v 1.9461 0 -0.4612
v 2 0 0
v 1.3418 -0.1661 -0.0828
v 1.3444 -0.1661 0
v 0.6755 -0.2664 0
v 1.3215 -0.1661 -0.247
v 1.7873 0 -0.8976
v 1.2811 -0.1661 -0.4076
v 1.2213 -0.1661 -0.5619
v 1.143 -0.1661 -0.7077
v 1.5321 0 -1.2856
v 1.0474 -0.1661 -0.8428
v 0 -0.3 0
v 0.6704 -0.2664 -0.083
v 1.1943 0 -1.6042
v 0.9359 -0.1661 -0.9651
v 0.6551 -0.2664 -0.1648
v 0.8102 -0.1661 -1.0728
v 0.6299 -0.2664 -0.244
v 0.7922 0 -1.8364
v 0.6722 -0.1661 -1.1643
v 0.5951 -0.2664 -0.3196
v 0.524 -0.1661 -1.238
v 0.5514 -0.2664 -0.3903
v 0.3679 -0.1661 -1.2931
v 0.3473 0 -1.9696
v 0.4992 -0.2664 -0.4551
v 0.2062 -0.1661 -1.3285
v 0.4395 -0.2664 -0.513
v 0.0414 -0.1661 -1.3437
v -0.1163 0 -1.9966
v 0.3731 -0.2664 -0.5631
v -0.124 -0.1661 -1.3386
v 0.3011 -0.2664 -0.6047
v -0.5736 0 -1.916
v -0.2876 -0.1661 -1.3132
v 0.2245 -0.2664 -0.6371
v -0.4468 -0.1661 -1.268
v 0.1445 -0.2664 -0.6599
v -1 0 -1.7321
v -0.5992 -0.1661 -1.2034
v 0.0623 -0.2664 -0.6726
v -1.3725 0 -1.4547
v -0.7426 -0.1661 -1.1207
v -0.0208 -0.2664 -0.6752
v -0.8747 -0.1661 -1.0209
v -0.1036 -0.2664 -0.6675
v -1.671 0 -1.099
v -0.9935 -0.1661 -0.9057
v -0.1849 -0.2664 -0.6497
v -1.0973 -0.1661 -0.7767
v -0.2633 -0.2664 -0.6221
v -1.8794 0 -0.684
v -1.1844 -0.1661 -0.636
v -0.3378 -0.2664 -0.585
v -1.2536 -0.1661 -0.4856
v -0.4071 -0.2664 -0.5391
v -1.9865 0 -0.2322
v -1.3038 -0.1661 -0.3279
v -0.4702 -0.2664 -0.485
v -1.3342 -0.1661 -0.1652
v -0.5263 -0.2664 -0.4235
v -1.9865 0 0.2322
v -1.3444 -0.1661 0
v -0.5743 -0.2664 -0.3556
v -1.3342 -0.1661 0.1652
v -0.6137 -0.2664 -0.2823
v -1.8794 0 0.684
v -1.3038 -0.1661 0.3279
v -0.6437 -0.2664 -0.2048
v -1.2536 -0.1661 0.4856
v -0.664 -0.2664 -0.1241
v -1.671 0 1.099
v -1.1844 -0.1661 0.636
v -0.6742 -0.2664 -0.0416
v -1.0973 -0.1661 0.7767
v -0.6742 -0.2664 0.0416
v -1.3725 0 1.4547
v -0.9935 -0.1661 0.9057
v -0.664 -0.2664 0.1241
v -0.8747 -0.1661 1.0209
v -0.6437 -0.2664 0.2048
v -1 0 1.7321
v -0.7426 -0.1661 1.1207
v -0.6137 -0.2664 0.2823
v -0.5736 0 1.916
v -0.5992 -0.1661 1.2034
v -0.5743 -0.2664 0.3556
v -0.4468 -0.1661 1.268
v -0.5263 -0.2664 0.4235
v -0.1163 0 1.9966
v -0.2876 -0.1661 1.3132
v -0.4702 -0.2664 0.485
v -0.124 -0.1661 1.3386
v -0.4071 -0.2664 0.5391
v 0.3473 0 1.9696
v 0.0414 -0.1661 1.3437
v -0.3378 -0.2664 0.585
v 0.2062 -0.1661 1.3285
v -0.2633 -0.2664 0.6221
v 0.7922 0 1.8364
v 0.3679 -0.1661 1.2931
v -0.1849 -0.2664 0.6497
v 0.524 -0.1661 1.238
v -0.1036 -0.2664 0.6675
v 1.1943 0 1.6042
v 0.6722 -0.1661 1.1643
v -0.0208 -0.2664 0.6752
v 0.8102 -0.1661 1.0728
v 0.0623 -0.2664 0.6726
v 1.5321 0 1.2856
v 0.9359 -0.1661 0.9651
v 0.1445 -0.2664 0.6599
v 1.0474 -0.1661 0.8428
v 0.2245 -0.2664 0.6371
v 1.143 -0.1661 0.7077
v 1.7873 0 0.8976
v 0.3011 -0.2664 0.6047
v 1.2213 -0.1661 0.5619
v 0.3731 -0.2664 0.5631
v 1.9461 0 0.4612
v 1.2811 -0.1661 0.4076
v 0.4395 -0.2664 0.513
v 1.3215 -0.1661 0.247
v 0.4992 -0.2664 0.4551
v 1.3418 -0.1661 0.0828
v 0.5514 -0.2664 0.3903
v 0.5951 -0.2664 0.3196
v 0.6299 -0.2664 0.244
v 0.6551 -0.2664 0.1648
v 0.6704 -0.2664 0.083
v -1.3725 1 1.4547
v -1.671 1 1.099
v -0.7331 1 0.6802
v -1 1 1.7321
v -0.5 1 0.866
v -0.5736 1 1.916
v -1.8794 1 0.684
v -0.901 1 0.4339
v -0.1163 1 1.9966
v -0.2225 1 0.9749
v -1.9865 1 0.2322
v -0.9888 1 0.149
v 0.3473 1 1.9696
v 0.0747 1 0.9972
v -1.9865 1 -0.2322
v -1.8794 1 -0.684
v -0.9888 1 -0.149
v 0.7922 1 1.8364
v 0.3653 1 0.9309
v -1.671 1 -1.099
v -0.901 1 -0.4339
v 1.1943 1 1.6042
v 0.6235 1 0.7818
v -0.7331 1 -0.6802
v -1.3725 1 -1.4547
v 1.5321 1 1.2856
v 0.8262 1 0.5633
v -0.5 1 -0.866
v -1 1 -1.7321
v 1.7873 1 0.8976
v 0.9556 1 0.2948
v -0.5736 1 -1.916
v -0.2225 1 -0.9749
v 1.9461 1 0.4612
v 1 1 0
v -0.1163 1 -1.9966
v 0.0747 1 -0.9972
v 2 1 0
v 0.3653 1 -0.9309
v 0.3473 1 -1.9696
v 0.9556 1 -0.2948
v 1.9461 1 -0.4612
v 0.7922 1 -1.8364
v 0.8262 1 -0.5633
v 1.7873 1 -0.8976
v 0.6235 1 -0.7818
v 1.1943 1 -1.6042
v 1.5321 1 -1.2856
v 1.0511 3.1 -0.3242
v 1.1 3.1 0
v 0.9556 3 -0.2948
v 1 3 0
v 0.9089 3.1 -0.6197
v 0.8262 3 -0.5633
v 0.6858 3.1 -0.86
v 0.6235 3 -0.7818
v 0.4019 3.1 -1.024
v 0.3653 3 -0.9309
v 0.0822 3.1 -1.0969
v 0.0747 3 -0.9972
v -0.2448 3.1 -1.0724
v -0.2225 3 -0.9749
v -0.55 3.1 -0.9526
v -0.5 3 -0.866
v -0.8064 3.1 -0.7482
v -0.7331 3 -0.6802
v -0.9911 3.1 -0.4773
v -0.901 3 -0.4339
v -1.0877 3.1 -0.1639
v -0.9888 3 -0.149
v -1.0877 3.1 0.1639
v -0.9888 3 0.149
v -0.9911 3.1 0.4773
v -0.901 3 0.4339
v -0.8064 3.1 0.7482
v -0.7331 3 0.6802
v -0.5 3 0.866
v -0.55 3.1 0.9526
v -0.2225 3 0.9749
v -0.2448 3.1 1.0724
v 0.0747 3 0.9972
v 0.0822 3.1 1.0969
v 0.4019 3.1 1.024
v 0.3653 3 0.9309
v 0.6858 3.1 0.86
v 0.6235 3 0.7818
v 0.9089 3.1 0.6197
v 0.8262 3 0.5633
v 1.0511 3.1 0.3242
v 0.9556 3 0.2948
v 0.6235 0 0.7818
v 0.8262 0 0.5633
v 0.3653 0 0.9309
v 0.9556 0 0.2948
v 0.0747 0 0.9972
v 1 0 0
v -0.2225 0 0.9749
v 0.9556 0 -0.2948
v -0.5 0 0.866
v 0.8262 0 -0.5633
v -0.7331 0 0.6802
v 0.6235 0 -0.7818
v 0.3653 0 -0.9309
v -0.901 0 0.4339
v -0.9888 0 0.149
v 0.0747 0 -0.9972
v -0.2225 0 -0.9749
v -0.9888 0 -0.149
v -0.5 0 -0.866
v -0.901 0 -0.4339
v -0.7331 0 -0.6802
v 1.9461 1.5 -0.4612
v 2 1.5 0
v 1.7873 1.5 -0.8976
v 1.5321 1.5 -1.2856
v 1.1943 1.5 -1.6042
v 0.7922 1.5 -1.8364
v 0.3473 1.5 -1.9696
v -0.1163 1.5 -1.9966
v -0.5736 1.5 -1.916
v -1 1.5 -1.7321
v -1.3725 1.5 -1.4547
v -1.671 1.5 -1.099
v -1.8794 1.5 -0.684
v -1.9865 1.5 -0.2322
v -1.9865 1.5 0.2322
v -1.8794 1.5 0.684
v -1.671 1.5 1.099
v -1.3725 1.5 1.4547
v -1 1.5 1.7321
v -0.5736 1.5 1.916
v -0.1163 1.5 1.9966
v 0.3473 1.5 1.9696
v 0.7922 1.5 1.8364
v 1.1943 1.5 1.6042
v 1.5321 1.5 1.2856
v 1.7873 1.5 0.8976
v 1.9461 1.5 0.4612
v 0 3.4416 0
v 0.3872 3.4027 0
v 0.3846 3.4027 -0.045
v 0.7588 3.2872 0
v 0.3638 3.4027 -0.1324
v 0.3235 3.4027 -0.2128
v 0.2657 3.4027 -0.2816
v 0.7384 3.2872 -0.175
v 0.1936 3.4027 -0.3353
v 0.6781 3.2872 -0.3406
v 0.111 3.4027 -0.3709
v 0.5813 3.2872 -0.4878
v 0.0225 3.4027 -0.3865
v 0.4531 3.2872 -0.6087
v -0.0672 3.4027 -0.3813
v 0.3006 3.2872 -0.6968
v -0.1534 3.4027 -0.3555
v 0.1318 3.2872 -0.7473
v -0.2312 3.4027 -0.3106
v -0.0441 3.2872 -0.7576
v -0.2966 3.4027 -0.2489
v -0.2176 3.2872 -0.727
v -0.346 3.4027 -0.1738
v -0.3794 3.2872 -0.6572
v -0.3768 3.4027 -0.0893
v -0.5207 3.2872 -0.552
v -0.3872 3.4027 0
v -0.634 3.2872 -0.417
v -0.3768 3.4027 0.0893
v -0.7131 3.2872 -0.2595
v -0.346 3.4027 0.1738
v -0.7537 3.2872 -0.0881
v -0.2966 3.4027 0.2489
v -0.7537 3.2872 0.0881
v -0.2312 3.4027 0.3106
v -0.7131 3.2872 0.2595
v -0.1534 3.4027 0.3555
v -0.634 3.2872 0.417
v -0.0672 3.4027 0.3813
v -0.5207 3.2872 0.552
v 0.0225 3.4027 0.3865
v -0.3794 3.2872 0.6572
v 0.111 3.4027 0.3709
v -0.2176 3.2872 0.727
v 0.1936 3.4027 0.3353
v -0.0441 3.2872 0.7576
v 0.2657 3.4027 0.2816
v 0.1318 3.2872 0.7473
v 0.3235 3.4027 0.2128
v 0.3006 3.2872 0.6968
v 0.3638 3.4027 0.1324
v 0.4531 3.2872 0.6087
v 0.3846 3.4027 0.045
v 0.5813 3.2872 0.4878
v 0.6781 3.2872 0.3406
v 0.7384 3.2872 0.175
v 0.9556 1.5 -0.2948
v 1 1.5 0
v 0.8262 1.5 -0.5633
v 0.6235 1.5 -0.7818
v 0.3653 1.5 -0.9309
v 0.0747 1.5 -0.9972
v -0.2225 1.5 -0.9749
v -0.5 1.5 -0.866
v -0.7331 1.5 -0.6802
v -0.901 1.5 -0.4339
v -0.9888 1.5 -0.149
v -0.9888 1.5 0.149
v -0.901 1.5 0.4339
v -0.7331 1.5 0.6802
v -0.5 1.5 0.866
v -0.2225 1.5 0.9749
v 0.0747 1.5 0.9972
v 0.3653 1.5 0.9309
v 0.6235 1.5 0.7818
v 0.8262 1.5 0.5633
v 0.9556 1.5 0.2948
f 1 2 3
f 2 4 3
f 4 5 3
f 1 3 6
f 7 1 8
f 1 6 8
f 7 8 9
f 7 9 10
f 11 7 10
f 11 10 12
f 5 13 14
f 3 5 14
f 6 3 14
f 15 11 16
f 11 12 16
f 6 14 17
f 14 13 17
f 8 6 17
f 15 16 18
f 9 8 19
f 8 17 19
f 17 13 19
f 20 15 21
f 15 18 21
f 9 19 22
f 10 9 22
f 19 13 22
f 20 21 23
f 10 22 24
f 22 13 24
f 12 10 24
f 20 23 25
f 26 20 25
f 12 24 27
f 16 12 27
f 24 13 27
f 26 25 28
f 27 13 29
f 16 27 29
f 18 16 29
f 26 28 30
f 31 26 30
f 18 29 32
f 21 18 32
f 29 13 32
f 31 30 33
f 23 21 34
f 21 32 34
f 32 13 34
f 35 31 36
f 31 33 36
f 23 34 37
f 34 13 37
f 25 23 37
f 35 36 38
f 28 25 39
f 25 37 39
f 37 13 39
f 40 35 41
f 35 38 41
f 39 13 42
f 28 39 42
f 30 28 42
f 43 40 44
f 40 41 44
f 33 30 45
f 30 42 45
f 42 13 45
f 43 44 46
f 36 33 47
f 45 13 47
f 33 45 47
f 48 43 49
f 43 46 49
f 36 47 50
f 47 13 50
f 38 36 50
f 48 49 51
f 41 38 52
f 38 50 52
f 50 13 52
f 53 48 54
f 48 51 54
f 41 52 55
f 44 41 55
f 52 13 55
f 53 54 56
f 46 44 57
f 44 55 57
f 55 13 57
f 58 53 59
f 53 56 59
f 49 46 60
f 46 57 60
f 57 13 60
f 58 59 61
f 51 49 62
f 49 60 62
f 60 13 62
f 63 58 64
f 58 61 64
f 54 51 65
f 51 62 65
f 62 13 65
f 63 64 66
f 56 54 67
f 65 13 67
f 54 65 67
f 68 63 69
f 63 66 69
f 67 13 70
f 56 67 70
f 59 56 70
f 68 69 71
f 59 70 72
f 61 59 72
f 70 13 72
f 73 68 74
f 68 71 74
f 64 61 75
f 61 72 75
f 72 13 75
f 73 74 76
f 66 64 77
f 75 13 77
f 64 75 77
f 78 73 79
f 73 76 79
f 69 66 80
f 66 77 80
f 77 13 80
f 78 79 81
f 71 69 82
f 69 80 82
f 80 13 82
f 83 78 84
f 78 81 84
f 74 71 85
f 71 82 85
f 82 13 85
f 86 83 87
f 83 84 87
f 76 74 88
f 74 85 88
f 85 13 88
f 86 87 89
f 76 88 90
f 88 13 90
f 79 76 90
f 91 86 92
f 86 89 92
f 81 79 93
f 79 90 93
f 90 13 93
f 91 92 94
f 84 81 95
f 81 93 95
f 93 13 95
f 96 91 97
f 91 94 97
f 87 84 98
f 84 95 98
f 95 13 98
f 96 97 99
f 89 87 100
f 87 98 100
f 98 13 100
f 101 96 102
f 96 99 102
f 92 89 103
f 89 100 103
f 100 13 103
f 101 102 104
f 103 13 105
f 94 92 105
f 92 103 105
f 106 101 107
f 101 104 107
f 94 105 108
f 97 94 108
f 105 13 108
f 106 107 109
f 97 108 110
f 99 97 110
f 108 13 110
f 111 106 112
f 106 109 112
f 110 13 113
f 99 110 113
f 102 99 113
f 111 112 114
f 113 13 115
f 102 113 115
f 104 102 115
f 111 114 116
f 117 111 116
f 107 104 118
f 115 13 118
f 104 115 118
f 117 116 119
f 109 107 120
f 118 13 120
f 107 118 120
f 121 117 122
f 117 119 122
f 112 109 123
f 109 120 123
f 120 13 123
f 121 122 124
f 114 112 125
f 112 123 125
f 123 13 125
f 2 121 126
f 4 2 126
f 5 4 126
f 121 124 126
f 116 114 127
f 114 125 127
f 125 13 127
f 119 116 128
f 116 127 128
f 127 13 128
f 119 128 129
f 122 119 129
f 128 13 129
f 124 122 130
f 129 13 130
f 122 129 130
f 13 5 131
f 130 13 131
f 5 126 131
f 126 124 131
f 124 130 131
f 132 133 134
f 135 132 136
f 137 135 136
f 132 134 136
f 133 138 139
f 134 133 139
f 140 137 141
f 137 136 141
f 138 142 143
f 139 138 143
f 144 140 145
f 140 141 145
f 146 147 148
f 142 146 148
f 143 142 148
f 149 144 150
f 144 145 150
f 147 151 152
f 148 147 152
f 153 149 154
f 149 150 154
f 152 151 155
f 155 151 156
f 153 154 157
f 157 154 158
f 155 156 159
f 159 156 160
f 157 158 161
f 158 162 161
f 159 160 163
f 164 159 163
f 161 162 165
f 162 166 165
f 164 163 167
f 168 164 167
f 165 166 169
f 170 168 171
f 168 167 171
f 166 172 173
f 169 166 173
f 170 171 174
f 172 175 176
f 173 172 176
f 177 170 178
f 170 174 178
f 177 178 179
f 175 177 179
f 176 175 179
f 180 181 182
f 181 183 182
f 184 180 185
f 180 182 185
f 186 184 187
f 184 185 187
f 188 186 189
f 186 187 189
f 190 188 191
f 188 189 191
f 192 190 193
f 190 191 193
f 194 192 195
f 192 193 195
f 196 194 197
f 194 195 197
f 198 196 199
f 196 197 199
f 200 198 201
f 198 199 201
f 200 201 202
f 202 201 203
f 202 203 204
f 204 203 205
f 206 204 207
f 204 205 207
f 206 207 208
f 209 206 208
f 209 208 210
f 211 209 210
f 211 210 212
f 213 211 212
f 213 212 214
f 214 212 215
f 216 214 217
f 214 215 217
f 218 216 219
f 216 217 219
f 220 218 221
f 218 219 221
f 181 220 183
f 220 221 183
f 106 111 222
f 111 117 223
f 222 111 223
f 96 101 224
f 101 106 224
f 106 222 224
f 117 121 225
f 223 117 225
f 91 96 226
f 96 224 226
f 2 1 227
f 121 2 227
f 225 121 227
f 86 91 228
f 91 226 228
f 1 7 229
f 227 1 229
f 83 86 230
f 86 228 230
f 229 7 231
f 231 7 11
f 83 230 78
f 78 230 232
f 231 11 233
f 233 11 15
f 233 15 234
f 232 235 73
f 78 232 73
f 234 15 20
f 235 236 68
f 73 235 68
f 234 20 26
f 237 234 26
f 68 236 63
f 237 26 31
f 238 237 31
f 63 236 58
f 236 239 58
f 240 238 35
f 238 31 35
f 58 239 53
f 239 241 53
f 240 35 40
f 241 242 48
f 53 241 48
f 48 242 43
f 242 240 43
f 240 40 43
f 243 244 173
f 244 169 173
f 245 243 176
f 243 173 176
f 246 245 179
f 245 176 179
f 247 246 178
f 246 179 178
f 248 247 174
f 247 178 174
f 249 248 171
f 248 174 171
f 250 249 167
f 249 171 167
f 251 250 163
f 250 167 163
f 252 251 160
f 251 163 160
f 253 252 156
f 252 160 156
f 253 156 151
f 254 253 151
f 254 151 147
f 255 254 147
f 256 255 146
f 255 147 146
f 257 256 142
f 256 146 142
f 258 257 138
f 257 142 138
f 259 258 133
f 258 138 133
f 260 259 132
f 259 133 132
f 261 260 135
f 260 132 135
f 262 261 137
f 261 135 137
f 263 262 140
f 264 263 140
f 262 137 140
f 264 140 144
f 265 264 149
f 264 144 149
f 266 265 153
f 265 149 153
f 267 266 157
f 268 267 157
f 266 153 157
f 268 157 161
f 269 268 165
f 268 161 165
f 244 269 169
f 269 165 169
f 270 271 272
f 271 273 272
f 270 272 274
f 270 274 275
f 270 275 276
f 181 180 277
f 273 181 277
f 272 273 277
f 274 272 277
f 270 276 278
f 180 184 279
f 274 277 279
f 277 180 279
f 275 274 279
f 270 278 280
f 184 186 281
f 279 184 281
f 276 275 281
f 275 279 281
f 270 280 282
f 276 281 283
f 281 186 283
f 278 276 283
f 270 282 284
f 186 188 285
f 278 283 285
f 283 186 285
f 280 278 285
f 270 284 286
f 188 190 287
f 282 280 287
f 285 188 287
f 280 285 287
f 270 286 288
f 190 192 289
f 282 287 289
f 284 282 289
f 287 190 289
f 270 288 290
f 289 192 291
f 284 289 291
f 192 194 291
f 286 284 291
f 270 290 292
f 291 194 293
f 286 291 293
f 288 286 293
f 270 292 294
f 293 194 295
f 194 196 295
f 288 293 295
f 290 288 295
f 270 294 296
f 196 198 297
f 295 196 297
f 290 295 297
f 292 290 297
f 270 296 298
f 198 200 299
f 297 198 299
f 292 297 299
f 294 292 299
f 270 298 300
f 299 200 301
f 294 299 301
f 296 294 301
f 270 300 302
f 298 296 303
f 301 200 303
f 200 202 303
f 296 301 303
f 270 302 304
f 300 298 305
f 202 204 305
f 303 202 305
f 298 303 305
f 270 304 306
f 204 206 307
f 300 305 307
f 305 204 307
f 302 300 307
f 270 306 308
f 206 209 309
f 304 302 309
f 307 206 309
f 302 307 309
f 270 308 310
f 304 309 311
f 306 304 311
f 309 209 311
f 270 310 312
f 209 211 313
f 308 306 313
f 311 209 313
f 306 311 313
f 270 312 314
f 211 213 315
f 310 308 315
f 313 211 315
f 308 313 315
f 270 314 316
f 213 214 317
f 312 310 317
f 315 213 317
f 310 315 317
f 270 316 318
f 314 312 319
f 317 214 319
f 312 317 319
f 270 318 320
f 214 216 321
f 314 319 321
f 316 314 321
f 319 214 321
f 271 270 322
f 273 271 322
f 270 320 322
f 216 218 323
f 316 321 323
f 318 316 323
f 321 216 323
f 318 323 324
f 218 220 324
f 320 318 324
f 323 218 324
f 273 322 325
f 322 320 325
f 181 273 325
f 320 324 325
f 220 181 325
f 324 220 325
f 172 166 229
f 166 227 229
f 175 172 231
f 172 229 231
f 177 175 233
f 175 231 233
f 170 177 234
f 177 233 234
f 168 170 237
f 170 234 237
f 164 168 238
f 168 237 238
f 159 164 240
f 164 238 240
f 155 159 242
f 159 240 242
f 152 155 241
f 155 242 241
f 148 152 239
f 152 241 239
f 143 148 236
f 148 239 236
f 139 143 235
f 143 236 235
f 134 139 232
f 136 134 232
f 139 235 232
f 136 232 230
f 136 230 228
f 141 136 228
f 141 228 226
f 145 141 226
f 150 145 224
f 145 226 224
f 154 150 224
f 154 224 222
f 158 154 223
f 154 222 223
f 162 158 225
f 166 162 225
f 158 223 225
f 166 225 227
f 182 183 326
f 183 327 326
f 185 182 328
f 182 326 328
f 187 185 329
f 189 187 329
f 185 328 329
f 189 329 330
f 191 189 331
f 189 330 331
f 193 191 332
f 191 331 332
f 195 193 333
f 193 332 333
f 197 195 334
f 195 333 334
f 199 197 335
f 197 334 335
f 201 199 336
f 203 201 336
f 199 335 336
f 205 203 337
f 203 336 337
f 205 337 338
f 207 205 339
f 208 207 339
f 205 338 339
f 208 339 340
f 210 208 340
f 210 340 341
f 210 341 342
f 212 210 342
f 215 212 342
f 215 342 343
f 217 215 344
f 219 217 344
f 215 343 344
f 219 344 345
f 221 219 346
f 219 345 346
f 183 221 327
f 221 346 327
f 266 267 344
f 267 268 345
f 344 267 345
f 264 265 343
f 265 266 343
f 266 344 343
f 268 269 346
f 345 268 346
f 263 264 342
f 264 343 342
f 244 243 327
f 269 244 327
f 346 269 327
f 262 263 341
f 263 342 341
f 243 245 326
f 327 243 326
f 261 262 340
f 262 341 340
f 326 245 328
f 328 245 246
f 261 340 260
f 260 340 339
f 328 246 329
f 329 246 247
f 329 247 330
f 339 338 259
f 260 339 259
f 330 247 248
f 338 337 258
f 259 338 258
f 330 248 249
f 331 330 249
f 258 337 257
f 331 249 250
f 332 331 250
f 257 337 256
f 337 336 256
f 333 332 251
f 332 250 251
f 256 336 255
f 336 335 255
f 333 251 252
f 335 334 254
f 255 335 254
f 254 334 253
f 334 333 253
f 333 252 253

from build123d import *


with BuildPart() as part:
    # Sketch2 → Revolve7 (revolve)
    with BuildSketch(Plane.XY):
        with BuildLine():
            Line((0, -0.3), (0, 3.441648784))
            ThreePointArc((0, 3.441648784), (0.575917505, 3.354270484), (1.1, 3.1))
            Line((1.1, 3.1), (1, 3))
            Line((1, 3), (1, 1.5))
            Line((1, 1.5), (2, 1.5))
            Line((2, 1.5), (2, 1))
            Line((2, 1), (1, 1))
            Line((1, 1), (1, 0))
            Line((1, 0), (2, 0))
            ThreePointArc((2, 0), (1.011187421, -0.224582805), (0, -0.3))
        make_face()
    revolve(axis=Axis((0, -0.3, 0), (0, 1, 0)))


solid = part.part
